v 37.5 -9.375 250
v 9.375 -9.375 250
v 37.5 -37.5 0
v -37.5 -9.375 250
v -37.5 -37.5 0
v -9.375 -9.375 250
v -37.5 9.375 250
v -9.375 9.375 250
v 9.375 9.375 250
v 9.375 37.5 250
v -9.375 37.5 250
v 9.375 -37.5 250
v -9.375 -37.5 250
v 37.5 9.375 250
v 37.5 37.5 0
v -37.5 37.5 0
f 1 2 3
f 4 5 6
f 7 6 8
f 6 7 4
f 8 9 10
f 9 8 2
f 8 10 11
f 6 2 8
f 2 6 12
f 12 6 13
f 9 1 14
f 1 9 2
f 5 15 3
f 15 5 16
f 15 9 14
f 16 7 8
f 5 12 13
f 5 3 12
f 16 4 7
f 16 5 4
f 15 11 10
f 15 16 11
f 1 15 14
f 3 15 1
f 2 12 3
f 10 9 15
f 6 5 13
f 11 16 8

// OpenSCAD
Taille=100;
RC=Taille*75/100;
PC=Taille/2;
Vue="Roi";//[Roi,Reine,Fou,Cavalier,Tour,Pion,Tout]
if(Vue=="Tout")
{
translate([-Taille*4,0,0])
roi();
translate([-Taille*3,0,0])
reine();
translate([-Taille*2,0,0])
fou();
translate([-Taille*1,0,0])
cavalier();
tour();
translate([Taille*1,0,0])
pion();}

if(Vue=="Roi"){roi();}
if(Vue=="Reine"){reine();}
if(Vue=="Fou"){fou();}
if(Vue=="Cavalier"){cavalier();}
if(Vue=="Tour"){tour();}
if(Vue=="Pion"){pion();}


module roi()
{
  union()
  {
  hull()
  {
    cube([RC,RC,0.00001],center=true);
    translate([0,0,Taille*2.5])
    cube([RC,RC/4,0.00001],center=true)  ;
  }
  hull()
  {
    cube([RC,RC,0.00001],center=true);
    translate([0,0,Taille*2.5])
    cube([RC/4,RC,0.00001],center=true)  ;
  }
}
}
module reine()
{
  union()
  {
    {
      for(i=[1:8])
      {
        hull()
        {
        cube([RC,RC,0.00001],center=true);
        translate([sin(360/8*i)*(RC/2-11),cos(360/8*i)*(RC/2-11),Taille*2.5-RC/2])
        {
          sphere(d=22,$fn=50);
        }
        }
      }
    }
  }  
}

module fou()
{
  union()
  {
  difference()
  {
    hull()
    {
      cube([RC,RC,0.00001],center=true);
      translate([0,0,Taille*2-RC/2])
      {
        sphere(r = RC/4,$fn=50);
        translate([0, 0, RC/4 * sin(RC/3)])
        cylinder(h = RC/3, r1 =  RC/4 * cos(RC/3), r2 = 0,$fn=50);
      }
    }
    translate([0,0,Taille*2-RC/2])
    difference()
    {
      cylinder(d=RC/3,h=Taille*2);
      cylinder(d=RC/4,h=Taille*3);
    }
  }
}
}
module cavalier()
{
  union()
  {
  hull()
  {
  cube([RC,RC,0.00001],center=true);
  translate([0,RC/4,Taille*2-RC/2])
  rotate([90,0,90])
  scale([0.5,1,1])
  cylinder(d=RC,h=RC/16,$fn=50,center=true);
  }
  hull()
  {
  translate([0,RC/4,Taille*2-RC/2])
  rotate([90,0,90])
  scale([0.5,1,1])
  cylinder(d=RC/4*3,h=RC/4,$fn=50,center=true);

  translate([0,-RC/4,Taille*2-RC])
  rotate([90,0,90])
  scale([0.5,0.5,1])
  cylinder(d=RC/4*3,h=RC/8,$fn=50,center=true);
  }
}

}

module tour()
{
  union()
  {
  hull()
  {
    cube([RC,RC,0.00001],center=true);
    translate([RC/3,RC/3,Taille*2.25])  
    cube([RC/3,RC/3,0.00001],center=true);
  }

  hull()
  {
    cube([RC,RC,0.00001],center=true);
    translate([RC/3,-RC/3,Taille*2.25])  
    cube([RC/3,RC/3,0.00001],center=true);
  }
  hull()
  {
    cube([RC,RC,0.00001],center=true);
    translate([-RC/3,RC/3,Taille*2.25])  
    cube([RC/3,RC/3,0.00001],center=true);
  }

  hull()
  {
    cube([RC,RC,0.00001],center=true);
    translate([-RC/3,-RC/3,Taille*2.25])  
    cube([RC/3,RC/3,0.00001],center=true);
  }
}
  
}

module pion()
{
  hull()
  {
    cube([PC,PC,0.00001],center=true);
    translate([0,0,Taille*1.25-PC/2])
    sphere(d=PC,$fn=50);
  }
}
